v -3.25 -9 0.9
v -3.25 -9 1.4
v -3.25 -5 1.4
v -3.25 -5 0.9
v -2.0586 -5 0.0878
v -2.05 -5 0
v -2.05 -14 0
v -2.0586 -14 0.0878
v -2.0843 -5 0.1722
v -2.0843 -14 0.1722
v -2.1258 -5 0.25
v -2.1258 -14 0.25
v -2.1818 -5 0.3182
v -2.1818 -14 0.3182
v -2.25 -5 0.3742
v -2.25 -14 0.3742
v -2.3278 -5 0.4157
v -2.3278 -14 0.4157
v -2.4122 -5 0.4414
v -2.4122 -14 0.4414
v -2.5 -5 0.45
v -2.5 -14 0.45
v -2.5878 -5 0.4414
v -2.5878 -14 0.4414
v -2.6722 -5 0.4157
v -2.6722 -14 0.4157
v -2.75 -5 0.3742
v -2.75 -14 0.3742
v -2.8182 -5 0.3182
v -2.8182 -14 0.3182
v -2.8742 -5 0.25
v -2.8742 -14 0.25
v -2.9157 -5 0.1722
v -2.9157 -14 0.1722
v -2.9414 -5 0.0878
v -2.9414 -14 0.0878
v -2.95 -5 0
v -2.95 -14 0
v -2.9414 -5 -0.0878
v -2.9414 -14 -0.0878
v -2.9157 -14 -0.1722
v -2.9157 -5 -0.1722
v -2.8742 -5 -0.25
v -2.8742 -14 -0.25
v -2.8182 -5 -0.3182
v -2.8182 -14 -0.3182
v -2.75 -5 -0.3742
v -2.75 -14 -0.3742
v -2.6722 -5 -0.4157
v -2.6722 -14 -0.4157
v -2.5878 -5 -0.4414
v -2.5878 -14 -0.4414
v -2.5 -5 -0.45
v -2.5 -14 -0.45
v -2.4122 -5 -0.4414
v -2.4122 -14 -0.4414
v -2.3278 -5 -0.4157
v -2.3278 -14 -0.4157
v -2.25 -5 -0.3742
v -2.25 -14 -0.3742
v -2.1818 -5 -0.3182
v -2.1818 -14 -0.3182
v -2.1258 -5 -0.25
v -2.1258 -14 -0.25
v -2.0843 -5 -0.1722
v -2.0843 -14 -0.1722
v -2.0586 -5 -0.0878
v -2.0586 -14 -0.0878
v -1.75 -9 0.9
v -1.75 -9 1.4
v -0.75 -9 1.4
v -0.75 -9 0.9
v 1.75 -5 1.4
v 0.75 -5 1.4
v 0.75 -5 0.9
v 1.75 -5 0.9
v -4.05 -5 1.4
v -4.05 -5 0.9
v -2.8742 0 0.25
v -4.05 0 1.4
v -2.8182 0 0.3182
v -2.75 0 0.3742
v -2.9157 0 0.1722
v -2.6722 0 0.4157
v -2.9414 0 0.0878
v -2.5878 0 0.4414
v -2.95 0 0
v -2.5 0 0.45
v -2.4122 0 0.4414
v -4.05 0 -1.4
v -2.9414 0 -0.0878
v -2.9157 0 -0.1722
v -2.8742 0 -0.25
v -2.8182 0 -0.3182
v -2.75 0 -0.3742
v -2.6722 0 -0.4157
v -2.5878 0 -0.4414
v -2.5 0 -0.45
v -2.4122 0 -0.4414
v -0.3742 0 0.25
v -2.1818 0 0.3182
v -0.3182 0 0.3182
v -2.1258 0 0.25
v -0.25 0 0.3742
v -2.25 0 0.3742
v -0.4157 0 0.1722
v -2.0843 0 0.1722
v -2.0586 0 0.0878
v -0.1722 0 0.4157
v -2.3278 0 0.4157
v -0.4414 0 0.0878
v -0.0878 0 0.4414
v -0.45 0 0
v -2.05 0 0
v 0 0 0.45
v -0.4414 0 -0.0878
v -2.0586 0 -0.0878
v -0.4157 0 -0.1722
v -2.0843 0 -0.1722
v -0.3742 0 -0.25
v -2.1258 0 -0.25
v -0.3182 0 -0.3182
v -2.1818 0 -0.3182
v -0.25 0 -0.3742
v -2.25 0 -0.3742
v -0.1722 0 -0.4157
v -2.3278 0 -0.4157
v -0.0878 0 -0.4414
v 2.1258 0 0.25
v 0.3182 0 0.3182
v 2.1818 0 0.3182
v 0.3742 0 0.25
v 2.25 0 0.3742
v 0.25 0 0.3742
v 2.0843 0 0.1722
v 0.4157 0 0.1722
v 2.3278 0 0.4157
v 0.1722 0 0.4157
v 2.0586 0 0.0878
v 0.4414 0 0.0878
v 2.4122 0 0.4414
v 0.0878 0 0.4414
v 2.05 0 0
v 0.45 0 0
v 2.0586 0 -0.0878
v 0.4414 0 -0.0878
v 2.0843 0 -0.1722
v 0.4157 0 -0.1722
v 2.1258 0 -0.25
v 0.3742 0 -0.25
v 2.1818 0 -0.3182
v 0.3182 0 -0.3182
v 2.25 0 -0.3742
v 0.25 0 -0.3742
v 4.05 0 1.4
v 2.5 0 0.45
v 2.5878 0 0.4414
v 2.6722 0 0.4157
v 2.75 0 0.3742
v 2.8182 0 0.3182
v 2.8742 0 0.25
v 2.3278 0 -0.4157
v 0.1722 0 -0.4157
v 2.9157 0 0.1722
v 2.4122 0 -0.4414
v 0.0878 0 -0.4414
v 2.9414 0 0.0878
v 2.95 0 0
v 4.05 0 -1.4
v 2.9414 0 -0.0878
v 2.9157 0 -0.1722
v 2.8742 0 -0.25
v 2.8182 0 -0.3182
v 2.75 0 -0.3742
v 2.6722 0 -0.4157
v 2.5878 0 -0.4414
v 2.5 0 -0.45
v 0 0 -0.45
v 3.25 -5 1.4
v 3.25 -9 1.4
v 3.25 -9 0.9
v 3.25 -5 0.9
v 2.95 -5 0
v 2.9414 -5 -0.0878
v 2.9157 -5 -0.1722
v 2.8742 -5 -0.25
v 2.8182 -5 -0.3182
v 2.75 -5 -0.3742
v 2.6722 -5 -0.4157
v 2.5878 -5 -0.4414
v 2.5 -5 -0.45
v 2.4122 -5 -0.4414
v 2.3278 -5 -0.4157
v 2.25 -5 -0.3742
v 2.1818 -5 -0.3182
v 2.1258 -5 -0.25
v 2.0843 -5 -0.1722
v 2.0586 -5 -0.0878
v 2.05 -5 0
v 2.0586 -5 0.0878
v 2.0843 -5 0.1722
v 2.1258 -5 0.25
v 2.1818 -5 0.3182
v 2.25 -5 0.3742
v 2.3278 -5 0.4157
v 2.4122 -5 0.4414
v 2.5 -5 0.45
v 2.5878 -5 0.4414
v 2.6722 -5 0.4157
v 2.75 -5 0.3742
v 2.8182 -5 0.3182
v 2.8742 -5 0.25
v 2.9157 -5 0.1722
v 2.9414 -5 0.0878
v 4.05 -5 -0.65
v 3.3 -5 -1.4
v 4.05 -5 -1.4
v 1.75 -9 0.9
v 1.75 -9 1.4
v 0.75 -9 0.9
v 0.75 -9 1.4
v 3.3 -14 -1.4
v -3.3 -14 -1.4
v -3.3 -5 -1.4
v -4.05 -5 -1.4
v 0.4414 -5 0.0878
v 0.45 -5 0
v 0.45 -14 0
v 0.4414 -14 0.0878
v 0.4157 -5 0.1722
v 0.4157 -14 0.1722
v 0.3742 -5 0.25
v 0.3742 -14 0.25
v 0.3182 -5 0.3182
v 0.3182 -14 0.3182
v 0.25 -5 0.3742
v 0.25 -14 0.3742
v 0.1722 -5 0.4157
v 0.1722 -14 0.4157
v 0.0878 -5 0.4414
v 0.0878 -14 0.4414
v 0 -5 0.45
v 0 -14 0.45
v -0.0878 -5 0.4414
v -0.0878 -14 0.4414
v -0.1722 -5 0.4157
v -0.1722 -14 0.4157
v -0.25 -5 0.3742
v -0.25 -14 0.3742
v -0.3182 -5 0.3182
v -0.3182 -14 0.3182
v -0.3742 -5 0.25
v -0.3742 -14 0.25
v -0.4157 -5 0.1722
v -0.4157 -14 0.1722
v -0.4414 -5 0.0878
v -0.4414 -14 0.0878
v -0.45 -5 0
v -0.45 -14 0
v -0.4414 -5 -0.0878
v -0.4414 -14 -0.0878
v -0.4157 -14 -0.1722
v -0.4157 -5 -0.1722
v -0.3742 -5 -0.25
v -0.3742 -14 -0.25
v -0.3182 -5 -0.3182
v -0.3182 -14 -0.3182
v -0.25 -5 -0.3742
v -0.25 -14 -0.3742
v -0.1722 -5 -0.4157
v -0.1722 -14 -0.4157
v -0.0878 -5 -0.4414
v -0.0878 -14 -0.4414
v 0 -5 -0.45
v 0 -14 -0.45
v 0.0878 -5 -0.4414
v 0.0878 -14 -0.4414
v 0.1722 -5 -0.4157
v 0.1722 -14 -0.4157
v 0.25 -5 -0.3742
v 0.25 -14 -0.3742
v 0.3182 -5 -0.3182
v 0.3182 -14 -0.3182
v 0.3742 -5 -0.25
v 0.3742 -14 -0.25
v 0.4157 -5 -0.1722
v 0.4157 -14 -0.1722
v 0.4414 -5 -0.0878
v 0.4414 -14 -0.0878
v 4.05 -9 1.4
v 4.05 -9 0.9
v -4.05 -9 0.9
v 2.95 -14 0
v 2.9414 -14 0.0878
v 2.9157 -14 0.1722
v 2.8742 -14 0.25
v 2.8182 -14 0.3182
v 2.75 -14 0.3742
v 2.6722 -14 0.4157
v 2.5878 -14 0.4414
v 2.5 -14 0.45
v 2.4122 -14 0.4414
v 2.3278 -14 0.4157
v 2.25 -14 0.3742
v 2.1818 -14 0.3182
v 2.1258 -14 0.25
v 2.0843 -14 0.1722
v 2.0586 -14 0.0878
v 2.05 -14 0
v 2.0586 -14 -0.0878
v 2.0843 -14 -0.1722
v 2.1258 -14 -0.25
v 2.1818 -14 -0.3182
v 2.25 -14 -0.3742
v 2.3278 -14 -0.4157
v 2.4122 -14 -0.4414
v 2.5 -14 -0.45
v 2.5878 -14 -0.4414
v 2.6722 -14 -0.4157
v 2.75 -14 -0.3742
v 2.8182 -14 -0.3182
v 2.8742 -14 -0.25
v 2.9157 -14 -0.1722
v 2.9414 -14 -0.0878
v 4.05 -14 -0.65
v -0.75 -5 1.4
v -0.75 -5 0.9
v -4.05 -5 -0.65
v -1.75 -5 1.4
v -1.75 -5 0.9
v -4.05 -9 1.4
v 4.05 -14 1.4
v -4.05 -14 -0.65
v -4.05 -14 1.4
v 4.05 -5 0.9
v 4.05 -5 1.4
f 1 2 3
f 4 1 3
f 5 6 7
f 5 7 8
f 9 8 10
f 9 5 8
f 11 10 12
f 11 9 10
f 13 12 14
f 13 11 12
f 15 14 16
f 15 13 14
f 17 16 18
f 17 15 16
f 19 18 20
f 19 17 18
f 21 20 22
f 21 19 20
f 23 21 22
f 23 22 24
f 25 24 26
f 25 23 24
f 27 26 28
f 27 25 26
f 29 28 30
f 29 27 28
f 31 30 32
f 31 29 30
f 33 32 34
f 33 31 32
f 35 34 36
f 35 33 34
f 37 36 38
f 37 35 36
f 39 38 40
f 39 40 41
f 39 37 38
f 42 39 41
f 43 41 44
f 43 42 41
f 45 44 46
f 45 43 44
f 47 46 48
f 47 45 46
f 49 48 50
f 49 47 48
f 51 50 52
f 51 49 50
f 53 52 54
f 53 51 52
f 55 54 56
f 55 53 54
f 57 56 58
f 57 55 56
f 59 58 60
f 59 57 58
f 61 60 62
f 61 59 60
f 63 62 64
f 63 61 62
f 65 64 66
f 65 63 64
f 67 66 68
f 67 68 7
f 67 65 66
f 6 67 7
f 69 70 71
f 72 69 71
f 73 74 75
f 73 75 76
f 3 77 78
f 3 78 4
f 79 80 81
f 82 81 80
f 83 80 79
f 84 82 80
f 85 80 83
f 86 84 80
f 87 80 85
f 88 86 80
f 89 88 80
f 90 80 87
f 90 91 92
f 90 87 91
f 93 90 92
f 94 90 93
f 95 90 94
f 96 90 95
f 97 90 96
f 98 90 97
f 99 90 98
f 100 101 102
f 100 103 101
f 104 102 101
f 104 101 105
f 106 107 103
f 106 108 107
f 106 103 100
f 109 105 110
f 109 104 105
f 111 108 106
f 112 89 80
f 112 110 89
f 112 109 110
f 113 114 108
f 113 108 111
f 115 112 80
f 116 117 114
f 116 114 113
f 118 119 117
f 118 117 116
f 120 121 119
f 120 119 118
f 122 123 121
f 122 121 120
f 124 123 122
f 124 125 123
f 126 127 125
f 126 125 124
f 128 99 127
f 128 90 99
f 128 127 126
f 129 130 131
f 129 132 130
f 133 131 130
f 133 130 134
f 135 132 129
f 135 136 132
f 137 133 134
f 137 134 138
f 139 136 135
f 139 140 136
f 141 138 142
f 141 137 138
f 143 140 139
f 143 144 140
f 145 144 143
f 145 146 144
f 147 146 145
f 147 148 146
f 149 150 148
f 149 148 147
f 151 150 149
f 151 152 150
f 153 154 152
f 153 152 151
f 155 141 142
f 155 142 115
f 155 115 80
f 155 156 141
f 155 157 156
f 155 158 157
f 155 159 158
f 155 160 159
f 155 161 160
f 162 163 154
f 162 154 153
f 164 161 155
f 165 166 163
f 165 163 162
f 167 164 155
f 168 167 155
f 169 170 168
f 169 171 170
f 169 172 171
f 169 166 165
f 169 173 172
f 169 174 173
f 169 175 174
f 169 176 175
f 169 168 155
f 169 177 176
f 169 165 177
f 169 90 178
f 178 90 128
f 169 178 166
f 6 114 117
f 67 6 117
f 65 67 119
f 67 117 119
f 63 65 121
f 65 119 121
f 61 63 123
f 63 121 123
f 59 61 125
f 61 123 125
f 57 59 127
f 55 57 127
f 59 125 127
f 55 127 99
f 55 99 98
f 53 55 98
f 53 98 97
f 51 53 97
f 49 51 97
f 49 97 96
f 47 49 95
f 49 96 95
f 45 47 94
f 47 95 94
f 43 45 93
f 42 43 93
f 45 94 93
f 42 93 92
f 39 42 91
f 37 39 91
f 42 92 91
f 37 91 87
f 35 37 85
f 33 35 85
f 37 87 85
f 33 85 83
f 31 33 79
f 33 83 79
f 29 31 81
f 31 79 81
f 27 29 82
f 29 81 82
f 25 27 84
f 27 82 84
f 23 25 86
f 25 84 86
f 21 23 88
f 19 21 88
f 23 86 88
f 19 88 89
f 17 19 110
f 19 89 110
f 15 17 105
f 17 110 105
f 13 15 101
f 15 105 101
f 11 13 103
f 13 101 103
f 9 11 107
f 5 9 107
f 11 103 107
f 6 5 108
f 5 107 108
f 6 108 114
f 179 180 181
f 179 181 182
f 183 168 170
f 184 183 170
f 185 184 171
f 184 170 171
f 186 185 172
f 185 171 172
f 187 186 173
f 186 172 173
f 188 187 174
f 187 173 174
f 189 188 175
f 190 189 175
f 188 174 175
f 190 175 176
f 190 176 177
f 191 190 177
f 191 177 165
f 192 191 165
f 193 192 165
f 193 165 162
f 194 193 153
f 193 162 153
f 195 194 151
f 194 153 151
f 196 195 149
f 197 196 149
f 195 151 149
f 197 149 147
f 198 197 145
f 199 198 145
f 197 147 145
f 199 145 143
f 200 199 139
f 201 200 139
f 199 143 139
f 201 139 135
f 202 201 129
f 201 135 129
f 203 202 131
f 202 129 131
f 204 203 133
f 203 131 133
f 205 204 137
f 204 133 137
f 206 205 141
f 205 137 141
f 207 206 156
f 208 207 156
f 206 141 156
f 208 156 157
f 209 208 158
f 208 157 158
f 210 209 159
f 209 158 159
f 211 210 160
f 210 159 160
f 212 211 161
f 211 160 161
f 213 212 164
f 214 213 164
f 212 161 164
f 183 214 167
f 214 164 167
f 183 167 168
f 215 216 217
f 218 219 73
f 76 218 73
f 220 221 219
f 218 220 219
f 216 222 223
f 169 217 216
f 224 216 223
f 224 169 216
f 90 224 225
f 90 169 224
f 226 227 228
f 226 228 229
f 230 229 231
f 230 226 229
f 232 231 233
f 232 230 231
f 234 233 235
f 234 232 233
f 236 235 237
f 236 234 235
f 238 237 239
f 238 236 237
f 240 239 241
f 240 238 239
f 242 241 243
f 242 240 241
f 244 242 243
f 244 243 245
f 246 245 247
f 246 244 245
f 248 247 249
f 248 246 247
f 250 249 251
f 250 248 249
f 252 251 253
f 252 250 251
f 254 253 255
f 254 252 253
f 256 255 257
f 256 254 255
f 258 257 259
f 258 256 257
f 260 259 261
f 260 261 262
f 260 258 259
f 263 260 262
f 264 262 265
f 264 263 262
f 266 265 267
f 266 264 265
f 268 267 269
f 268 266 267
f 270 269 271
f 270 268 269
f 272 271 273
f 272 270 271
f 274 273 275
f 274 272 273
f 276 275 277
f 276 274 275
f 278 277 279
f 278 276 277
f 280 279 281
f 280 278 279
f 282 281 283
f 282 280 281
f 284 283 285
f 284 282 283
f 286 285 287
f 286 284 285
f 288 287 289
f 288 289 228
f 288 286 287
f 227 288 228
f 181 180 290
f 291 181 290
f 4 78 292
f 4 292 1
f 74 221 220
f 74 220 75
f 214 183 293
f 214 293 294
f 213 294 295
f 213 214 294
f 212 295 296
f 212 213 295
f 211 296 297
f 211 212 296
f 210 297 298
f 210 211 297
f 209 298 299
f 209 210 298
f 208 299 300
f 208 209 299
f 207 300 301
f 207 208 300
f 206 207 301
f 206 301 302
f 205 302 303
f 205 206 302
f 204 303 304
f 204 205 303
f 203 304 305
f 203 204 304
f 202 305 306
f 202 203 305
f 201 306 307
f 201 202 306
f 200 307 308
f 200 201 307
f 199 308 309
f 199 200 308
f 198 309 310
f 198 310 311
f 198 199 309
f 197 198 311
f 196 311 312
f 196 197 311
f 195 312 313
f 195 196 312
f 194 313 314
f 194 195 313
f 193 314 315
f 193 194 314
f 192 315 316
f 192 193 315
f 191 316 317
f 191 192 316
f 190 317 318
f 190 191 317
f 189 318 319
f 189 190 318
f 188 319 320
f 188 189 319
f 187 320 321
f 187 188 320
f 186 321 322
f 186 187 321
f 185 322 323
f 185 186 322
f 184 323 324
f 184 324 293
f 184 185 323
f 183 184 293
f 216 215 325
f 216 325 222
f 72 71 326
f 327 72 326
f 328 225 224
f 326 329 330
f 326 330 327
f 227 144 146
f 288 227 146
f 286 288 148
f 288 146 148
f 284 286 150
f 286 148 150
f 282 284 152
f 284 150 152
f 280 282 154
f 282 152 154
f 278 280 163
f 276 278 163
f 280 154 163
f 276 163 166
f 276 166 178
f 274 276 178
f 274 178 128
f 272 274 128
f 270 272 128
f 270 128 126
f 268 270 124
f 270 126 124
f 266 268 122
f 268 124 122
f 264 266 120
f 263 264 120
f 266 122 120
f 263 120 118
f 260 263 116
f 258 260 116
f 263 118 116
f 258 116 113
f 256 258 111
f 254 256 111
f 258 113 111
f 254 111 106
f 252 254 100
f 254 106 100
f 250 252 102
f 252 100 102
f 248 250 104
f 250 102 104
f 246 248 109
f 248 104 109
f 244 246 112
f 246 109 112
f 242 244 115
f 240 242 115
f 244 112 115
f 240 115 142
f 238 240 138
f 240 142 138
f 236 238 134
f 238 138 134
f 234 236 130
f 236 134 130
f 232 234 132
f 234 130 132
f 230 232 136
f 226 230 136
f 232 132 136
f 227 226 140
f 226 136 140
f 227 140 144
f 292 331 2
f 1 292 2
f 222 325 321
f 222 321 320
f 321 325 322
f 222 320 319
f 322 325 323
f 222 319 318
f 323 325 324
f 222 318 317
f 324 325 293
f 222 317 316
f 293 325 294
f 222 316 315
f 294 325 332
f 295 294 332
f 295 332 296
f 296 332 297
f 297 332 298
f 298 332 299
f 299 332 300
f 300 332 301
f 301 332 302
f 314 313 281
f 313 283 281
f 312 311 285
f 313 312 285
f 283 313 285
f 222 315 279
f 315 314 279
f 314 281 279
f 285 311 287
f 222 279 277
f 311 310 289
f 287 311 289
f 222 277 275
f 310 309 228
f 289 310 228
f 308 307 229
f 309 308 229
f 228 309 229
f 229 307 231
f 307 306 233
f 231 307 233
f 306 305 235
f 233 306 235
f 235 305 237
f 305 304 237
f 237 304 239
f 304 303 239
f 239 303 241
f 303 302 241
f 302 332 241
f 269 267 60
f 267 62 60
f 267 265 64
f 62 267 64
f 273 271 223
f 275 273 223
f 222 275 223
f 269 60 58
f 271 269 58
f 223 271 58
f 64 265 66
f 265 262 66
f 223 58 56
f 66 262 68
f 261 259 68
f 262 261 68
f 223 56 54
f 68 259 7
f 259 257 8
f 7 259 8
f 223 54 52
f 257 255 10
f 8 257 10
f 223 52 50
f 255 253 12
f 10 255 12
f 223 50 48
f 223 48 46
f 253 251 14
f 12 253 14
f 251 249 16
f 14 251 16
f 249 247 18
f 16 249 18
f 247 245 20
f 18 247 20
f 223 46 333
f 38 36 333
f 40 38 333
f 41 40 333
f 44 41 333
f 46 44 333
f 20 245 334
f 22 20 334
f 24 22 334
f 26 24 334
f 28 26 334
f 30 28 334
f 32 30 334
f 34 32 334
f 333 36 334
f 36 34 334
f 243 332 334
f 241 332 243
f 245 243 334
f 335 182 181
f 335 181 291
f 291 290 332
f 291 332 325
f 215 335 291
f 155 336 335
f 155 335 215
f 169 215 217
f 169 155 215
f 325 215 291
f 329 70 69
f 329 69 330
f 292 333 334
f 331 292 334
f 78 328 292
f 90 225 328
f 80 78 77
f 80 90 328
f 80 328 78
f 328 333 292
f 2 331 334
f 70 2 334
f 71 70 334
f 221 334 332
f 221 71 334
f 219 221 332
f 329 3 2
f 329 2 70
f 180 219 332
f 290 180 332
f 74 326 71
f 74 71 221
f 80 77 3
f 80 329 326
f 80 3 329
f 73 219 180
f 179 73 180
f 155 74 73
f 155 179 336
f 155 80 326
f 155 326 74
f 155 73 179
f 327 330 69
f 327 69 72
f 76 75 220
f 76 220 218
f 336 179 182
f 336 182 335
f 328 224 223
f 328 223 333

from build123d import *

# Parameters (mm, degrees)
SKETCH3_W           = 8.1
SKETCH3_H           = 2.8
SKETCH3_R           = 0.45
BOSS_EXTRUDE1_DEPTH = 5
SKETCH4_R           = 0.45
BOSS_EXTRUDE4_DEPTH = 9
SKETCH7_W           = 1
SKETCH7_H           = 4
CUT_EXTRUDE2_DEPTH  = 0.5


with BuildPart() as part:
    # Sketch3 → Boss-Extrude1 (new body)
    with BuildSketch(Plane(origin=(0, 0, 0), x_dir=(1, 0, 0), z_dir=(0, 1, 0))):
        Rectangle(SKETCH3_W, SKETCH3_H)
        with Locations((2.5, 0)):
            Circle(SKETCH3_R, mode=Mode.SUBTRACT)
        with Locations((-2.5, 0)):
            Circle(SKETCH3_R, mode=Mode.SUBTRACT)
        Circle(SKETCH3_R, mode=Mode.SUBTRACT)
    extrude(amount=-BOSS_EXTRUDE1_DEPTH)

    # Sketch4 → Boss-Extrude4 (add)
    with BuildSketch(Plane.XZ.offset(5)):
        Polygon((4.05, -0.65), (3.3, -1.4), (-3.3, -1.4), (-4.05, -0.65), (-4.05, 1.4), (4.05, 1.4), align=None)
        with Locations((2.5, 0)):
            Circle(SKETCH4_R, mode=Mode.SUBTRACT)
        Circle(SKETCH4_R, mode=Mode.SUBTRACT)
        with Locations((-2.5, 0)):
            Circle(SKETCH4_R, mode=Mode.SUBTRACT)
    extrude(amount=BOSS_EXTRUDE4_DEPTH)

    # Sketch7 → Cut-Extrude2 (cut)
    with BuildSketch(Plane.XY.offset(1.4)):
        with Locations((-3.75, -7)):
            Rectangle(SKETCH7_W, SKETCH7_H)
        with Locations((3.75, -7)):
            Rectangle(SKETCH7_W, SKETCH7_H)
        with Locations((-1.25, -7)):
            Rectangle(SKETCH7_W, SKETCH7_H)
        with Locations((1.25, -7)):
            Rectangle(SKETCH7_W, SKETCH7_H)
    extrude(amount=-CUT_EXTRUDE2_DEPTH, mode=Mode.SUBTRACT)


solid = part.part
